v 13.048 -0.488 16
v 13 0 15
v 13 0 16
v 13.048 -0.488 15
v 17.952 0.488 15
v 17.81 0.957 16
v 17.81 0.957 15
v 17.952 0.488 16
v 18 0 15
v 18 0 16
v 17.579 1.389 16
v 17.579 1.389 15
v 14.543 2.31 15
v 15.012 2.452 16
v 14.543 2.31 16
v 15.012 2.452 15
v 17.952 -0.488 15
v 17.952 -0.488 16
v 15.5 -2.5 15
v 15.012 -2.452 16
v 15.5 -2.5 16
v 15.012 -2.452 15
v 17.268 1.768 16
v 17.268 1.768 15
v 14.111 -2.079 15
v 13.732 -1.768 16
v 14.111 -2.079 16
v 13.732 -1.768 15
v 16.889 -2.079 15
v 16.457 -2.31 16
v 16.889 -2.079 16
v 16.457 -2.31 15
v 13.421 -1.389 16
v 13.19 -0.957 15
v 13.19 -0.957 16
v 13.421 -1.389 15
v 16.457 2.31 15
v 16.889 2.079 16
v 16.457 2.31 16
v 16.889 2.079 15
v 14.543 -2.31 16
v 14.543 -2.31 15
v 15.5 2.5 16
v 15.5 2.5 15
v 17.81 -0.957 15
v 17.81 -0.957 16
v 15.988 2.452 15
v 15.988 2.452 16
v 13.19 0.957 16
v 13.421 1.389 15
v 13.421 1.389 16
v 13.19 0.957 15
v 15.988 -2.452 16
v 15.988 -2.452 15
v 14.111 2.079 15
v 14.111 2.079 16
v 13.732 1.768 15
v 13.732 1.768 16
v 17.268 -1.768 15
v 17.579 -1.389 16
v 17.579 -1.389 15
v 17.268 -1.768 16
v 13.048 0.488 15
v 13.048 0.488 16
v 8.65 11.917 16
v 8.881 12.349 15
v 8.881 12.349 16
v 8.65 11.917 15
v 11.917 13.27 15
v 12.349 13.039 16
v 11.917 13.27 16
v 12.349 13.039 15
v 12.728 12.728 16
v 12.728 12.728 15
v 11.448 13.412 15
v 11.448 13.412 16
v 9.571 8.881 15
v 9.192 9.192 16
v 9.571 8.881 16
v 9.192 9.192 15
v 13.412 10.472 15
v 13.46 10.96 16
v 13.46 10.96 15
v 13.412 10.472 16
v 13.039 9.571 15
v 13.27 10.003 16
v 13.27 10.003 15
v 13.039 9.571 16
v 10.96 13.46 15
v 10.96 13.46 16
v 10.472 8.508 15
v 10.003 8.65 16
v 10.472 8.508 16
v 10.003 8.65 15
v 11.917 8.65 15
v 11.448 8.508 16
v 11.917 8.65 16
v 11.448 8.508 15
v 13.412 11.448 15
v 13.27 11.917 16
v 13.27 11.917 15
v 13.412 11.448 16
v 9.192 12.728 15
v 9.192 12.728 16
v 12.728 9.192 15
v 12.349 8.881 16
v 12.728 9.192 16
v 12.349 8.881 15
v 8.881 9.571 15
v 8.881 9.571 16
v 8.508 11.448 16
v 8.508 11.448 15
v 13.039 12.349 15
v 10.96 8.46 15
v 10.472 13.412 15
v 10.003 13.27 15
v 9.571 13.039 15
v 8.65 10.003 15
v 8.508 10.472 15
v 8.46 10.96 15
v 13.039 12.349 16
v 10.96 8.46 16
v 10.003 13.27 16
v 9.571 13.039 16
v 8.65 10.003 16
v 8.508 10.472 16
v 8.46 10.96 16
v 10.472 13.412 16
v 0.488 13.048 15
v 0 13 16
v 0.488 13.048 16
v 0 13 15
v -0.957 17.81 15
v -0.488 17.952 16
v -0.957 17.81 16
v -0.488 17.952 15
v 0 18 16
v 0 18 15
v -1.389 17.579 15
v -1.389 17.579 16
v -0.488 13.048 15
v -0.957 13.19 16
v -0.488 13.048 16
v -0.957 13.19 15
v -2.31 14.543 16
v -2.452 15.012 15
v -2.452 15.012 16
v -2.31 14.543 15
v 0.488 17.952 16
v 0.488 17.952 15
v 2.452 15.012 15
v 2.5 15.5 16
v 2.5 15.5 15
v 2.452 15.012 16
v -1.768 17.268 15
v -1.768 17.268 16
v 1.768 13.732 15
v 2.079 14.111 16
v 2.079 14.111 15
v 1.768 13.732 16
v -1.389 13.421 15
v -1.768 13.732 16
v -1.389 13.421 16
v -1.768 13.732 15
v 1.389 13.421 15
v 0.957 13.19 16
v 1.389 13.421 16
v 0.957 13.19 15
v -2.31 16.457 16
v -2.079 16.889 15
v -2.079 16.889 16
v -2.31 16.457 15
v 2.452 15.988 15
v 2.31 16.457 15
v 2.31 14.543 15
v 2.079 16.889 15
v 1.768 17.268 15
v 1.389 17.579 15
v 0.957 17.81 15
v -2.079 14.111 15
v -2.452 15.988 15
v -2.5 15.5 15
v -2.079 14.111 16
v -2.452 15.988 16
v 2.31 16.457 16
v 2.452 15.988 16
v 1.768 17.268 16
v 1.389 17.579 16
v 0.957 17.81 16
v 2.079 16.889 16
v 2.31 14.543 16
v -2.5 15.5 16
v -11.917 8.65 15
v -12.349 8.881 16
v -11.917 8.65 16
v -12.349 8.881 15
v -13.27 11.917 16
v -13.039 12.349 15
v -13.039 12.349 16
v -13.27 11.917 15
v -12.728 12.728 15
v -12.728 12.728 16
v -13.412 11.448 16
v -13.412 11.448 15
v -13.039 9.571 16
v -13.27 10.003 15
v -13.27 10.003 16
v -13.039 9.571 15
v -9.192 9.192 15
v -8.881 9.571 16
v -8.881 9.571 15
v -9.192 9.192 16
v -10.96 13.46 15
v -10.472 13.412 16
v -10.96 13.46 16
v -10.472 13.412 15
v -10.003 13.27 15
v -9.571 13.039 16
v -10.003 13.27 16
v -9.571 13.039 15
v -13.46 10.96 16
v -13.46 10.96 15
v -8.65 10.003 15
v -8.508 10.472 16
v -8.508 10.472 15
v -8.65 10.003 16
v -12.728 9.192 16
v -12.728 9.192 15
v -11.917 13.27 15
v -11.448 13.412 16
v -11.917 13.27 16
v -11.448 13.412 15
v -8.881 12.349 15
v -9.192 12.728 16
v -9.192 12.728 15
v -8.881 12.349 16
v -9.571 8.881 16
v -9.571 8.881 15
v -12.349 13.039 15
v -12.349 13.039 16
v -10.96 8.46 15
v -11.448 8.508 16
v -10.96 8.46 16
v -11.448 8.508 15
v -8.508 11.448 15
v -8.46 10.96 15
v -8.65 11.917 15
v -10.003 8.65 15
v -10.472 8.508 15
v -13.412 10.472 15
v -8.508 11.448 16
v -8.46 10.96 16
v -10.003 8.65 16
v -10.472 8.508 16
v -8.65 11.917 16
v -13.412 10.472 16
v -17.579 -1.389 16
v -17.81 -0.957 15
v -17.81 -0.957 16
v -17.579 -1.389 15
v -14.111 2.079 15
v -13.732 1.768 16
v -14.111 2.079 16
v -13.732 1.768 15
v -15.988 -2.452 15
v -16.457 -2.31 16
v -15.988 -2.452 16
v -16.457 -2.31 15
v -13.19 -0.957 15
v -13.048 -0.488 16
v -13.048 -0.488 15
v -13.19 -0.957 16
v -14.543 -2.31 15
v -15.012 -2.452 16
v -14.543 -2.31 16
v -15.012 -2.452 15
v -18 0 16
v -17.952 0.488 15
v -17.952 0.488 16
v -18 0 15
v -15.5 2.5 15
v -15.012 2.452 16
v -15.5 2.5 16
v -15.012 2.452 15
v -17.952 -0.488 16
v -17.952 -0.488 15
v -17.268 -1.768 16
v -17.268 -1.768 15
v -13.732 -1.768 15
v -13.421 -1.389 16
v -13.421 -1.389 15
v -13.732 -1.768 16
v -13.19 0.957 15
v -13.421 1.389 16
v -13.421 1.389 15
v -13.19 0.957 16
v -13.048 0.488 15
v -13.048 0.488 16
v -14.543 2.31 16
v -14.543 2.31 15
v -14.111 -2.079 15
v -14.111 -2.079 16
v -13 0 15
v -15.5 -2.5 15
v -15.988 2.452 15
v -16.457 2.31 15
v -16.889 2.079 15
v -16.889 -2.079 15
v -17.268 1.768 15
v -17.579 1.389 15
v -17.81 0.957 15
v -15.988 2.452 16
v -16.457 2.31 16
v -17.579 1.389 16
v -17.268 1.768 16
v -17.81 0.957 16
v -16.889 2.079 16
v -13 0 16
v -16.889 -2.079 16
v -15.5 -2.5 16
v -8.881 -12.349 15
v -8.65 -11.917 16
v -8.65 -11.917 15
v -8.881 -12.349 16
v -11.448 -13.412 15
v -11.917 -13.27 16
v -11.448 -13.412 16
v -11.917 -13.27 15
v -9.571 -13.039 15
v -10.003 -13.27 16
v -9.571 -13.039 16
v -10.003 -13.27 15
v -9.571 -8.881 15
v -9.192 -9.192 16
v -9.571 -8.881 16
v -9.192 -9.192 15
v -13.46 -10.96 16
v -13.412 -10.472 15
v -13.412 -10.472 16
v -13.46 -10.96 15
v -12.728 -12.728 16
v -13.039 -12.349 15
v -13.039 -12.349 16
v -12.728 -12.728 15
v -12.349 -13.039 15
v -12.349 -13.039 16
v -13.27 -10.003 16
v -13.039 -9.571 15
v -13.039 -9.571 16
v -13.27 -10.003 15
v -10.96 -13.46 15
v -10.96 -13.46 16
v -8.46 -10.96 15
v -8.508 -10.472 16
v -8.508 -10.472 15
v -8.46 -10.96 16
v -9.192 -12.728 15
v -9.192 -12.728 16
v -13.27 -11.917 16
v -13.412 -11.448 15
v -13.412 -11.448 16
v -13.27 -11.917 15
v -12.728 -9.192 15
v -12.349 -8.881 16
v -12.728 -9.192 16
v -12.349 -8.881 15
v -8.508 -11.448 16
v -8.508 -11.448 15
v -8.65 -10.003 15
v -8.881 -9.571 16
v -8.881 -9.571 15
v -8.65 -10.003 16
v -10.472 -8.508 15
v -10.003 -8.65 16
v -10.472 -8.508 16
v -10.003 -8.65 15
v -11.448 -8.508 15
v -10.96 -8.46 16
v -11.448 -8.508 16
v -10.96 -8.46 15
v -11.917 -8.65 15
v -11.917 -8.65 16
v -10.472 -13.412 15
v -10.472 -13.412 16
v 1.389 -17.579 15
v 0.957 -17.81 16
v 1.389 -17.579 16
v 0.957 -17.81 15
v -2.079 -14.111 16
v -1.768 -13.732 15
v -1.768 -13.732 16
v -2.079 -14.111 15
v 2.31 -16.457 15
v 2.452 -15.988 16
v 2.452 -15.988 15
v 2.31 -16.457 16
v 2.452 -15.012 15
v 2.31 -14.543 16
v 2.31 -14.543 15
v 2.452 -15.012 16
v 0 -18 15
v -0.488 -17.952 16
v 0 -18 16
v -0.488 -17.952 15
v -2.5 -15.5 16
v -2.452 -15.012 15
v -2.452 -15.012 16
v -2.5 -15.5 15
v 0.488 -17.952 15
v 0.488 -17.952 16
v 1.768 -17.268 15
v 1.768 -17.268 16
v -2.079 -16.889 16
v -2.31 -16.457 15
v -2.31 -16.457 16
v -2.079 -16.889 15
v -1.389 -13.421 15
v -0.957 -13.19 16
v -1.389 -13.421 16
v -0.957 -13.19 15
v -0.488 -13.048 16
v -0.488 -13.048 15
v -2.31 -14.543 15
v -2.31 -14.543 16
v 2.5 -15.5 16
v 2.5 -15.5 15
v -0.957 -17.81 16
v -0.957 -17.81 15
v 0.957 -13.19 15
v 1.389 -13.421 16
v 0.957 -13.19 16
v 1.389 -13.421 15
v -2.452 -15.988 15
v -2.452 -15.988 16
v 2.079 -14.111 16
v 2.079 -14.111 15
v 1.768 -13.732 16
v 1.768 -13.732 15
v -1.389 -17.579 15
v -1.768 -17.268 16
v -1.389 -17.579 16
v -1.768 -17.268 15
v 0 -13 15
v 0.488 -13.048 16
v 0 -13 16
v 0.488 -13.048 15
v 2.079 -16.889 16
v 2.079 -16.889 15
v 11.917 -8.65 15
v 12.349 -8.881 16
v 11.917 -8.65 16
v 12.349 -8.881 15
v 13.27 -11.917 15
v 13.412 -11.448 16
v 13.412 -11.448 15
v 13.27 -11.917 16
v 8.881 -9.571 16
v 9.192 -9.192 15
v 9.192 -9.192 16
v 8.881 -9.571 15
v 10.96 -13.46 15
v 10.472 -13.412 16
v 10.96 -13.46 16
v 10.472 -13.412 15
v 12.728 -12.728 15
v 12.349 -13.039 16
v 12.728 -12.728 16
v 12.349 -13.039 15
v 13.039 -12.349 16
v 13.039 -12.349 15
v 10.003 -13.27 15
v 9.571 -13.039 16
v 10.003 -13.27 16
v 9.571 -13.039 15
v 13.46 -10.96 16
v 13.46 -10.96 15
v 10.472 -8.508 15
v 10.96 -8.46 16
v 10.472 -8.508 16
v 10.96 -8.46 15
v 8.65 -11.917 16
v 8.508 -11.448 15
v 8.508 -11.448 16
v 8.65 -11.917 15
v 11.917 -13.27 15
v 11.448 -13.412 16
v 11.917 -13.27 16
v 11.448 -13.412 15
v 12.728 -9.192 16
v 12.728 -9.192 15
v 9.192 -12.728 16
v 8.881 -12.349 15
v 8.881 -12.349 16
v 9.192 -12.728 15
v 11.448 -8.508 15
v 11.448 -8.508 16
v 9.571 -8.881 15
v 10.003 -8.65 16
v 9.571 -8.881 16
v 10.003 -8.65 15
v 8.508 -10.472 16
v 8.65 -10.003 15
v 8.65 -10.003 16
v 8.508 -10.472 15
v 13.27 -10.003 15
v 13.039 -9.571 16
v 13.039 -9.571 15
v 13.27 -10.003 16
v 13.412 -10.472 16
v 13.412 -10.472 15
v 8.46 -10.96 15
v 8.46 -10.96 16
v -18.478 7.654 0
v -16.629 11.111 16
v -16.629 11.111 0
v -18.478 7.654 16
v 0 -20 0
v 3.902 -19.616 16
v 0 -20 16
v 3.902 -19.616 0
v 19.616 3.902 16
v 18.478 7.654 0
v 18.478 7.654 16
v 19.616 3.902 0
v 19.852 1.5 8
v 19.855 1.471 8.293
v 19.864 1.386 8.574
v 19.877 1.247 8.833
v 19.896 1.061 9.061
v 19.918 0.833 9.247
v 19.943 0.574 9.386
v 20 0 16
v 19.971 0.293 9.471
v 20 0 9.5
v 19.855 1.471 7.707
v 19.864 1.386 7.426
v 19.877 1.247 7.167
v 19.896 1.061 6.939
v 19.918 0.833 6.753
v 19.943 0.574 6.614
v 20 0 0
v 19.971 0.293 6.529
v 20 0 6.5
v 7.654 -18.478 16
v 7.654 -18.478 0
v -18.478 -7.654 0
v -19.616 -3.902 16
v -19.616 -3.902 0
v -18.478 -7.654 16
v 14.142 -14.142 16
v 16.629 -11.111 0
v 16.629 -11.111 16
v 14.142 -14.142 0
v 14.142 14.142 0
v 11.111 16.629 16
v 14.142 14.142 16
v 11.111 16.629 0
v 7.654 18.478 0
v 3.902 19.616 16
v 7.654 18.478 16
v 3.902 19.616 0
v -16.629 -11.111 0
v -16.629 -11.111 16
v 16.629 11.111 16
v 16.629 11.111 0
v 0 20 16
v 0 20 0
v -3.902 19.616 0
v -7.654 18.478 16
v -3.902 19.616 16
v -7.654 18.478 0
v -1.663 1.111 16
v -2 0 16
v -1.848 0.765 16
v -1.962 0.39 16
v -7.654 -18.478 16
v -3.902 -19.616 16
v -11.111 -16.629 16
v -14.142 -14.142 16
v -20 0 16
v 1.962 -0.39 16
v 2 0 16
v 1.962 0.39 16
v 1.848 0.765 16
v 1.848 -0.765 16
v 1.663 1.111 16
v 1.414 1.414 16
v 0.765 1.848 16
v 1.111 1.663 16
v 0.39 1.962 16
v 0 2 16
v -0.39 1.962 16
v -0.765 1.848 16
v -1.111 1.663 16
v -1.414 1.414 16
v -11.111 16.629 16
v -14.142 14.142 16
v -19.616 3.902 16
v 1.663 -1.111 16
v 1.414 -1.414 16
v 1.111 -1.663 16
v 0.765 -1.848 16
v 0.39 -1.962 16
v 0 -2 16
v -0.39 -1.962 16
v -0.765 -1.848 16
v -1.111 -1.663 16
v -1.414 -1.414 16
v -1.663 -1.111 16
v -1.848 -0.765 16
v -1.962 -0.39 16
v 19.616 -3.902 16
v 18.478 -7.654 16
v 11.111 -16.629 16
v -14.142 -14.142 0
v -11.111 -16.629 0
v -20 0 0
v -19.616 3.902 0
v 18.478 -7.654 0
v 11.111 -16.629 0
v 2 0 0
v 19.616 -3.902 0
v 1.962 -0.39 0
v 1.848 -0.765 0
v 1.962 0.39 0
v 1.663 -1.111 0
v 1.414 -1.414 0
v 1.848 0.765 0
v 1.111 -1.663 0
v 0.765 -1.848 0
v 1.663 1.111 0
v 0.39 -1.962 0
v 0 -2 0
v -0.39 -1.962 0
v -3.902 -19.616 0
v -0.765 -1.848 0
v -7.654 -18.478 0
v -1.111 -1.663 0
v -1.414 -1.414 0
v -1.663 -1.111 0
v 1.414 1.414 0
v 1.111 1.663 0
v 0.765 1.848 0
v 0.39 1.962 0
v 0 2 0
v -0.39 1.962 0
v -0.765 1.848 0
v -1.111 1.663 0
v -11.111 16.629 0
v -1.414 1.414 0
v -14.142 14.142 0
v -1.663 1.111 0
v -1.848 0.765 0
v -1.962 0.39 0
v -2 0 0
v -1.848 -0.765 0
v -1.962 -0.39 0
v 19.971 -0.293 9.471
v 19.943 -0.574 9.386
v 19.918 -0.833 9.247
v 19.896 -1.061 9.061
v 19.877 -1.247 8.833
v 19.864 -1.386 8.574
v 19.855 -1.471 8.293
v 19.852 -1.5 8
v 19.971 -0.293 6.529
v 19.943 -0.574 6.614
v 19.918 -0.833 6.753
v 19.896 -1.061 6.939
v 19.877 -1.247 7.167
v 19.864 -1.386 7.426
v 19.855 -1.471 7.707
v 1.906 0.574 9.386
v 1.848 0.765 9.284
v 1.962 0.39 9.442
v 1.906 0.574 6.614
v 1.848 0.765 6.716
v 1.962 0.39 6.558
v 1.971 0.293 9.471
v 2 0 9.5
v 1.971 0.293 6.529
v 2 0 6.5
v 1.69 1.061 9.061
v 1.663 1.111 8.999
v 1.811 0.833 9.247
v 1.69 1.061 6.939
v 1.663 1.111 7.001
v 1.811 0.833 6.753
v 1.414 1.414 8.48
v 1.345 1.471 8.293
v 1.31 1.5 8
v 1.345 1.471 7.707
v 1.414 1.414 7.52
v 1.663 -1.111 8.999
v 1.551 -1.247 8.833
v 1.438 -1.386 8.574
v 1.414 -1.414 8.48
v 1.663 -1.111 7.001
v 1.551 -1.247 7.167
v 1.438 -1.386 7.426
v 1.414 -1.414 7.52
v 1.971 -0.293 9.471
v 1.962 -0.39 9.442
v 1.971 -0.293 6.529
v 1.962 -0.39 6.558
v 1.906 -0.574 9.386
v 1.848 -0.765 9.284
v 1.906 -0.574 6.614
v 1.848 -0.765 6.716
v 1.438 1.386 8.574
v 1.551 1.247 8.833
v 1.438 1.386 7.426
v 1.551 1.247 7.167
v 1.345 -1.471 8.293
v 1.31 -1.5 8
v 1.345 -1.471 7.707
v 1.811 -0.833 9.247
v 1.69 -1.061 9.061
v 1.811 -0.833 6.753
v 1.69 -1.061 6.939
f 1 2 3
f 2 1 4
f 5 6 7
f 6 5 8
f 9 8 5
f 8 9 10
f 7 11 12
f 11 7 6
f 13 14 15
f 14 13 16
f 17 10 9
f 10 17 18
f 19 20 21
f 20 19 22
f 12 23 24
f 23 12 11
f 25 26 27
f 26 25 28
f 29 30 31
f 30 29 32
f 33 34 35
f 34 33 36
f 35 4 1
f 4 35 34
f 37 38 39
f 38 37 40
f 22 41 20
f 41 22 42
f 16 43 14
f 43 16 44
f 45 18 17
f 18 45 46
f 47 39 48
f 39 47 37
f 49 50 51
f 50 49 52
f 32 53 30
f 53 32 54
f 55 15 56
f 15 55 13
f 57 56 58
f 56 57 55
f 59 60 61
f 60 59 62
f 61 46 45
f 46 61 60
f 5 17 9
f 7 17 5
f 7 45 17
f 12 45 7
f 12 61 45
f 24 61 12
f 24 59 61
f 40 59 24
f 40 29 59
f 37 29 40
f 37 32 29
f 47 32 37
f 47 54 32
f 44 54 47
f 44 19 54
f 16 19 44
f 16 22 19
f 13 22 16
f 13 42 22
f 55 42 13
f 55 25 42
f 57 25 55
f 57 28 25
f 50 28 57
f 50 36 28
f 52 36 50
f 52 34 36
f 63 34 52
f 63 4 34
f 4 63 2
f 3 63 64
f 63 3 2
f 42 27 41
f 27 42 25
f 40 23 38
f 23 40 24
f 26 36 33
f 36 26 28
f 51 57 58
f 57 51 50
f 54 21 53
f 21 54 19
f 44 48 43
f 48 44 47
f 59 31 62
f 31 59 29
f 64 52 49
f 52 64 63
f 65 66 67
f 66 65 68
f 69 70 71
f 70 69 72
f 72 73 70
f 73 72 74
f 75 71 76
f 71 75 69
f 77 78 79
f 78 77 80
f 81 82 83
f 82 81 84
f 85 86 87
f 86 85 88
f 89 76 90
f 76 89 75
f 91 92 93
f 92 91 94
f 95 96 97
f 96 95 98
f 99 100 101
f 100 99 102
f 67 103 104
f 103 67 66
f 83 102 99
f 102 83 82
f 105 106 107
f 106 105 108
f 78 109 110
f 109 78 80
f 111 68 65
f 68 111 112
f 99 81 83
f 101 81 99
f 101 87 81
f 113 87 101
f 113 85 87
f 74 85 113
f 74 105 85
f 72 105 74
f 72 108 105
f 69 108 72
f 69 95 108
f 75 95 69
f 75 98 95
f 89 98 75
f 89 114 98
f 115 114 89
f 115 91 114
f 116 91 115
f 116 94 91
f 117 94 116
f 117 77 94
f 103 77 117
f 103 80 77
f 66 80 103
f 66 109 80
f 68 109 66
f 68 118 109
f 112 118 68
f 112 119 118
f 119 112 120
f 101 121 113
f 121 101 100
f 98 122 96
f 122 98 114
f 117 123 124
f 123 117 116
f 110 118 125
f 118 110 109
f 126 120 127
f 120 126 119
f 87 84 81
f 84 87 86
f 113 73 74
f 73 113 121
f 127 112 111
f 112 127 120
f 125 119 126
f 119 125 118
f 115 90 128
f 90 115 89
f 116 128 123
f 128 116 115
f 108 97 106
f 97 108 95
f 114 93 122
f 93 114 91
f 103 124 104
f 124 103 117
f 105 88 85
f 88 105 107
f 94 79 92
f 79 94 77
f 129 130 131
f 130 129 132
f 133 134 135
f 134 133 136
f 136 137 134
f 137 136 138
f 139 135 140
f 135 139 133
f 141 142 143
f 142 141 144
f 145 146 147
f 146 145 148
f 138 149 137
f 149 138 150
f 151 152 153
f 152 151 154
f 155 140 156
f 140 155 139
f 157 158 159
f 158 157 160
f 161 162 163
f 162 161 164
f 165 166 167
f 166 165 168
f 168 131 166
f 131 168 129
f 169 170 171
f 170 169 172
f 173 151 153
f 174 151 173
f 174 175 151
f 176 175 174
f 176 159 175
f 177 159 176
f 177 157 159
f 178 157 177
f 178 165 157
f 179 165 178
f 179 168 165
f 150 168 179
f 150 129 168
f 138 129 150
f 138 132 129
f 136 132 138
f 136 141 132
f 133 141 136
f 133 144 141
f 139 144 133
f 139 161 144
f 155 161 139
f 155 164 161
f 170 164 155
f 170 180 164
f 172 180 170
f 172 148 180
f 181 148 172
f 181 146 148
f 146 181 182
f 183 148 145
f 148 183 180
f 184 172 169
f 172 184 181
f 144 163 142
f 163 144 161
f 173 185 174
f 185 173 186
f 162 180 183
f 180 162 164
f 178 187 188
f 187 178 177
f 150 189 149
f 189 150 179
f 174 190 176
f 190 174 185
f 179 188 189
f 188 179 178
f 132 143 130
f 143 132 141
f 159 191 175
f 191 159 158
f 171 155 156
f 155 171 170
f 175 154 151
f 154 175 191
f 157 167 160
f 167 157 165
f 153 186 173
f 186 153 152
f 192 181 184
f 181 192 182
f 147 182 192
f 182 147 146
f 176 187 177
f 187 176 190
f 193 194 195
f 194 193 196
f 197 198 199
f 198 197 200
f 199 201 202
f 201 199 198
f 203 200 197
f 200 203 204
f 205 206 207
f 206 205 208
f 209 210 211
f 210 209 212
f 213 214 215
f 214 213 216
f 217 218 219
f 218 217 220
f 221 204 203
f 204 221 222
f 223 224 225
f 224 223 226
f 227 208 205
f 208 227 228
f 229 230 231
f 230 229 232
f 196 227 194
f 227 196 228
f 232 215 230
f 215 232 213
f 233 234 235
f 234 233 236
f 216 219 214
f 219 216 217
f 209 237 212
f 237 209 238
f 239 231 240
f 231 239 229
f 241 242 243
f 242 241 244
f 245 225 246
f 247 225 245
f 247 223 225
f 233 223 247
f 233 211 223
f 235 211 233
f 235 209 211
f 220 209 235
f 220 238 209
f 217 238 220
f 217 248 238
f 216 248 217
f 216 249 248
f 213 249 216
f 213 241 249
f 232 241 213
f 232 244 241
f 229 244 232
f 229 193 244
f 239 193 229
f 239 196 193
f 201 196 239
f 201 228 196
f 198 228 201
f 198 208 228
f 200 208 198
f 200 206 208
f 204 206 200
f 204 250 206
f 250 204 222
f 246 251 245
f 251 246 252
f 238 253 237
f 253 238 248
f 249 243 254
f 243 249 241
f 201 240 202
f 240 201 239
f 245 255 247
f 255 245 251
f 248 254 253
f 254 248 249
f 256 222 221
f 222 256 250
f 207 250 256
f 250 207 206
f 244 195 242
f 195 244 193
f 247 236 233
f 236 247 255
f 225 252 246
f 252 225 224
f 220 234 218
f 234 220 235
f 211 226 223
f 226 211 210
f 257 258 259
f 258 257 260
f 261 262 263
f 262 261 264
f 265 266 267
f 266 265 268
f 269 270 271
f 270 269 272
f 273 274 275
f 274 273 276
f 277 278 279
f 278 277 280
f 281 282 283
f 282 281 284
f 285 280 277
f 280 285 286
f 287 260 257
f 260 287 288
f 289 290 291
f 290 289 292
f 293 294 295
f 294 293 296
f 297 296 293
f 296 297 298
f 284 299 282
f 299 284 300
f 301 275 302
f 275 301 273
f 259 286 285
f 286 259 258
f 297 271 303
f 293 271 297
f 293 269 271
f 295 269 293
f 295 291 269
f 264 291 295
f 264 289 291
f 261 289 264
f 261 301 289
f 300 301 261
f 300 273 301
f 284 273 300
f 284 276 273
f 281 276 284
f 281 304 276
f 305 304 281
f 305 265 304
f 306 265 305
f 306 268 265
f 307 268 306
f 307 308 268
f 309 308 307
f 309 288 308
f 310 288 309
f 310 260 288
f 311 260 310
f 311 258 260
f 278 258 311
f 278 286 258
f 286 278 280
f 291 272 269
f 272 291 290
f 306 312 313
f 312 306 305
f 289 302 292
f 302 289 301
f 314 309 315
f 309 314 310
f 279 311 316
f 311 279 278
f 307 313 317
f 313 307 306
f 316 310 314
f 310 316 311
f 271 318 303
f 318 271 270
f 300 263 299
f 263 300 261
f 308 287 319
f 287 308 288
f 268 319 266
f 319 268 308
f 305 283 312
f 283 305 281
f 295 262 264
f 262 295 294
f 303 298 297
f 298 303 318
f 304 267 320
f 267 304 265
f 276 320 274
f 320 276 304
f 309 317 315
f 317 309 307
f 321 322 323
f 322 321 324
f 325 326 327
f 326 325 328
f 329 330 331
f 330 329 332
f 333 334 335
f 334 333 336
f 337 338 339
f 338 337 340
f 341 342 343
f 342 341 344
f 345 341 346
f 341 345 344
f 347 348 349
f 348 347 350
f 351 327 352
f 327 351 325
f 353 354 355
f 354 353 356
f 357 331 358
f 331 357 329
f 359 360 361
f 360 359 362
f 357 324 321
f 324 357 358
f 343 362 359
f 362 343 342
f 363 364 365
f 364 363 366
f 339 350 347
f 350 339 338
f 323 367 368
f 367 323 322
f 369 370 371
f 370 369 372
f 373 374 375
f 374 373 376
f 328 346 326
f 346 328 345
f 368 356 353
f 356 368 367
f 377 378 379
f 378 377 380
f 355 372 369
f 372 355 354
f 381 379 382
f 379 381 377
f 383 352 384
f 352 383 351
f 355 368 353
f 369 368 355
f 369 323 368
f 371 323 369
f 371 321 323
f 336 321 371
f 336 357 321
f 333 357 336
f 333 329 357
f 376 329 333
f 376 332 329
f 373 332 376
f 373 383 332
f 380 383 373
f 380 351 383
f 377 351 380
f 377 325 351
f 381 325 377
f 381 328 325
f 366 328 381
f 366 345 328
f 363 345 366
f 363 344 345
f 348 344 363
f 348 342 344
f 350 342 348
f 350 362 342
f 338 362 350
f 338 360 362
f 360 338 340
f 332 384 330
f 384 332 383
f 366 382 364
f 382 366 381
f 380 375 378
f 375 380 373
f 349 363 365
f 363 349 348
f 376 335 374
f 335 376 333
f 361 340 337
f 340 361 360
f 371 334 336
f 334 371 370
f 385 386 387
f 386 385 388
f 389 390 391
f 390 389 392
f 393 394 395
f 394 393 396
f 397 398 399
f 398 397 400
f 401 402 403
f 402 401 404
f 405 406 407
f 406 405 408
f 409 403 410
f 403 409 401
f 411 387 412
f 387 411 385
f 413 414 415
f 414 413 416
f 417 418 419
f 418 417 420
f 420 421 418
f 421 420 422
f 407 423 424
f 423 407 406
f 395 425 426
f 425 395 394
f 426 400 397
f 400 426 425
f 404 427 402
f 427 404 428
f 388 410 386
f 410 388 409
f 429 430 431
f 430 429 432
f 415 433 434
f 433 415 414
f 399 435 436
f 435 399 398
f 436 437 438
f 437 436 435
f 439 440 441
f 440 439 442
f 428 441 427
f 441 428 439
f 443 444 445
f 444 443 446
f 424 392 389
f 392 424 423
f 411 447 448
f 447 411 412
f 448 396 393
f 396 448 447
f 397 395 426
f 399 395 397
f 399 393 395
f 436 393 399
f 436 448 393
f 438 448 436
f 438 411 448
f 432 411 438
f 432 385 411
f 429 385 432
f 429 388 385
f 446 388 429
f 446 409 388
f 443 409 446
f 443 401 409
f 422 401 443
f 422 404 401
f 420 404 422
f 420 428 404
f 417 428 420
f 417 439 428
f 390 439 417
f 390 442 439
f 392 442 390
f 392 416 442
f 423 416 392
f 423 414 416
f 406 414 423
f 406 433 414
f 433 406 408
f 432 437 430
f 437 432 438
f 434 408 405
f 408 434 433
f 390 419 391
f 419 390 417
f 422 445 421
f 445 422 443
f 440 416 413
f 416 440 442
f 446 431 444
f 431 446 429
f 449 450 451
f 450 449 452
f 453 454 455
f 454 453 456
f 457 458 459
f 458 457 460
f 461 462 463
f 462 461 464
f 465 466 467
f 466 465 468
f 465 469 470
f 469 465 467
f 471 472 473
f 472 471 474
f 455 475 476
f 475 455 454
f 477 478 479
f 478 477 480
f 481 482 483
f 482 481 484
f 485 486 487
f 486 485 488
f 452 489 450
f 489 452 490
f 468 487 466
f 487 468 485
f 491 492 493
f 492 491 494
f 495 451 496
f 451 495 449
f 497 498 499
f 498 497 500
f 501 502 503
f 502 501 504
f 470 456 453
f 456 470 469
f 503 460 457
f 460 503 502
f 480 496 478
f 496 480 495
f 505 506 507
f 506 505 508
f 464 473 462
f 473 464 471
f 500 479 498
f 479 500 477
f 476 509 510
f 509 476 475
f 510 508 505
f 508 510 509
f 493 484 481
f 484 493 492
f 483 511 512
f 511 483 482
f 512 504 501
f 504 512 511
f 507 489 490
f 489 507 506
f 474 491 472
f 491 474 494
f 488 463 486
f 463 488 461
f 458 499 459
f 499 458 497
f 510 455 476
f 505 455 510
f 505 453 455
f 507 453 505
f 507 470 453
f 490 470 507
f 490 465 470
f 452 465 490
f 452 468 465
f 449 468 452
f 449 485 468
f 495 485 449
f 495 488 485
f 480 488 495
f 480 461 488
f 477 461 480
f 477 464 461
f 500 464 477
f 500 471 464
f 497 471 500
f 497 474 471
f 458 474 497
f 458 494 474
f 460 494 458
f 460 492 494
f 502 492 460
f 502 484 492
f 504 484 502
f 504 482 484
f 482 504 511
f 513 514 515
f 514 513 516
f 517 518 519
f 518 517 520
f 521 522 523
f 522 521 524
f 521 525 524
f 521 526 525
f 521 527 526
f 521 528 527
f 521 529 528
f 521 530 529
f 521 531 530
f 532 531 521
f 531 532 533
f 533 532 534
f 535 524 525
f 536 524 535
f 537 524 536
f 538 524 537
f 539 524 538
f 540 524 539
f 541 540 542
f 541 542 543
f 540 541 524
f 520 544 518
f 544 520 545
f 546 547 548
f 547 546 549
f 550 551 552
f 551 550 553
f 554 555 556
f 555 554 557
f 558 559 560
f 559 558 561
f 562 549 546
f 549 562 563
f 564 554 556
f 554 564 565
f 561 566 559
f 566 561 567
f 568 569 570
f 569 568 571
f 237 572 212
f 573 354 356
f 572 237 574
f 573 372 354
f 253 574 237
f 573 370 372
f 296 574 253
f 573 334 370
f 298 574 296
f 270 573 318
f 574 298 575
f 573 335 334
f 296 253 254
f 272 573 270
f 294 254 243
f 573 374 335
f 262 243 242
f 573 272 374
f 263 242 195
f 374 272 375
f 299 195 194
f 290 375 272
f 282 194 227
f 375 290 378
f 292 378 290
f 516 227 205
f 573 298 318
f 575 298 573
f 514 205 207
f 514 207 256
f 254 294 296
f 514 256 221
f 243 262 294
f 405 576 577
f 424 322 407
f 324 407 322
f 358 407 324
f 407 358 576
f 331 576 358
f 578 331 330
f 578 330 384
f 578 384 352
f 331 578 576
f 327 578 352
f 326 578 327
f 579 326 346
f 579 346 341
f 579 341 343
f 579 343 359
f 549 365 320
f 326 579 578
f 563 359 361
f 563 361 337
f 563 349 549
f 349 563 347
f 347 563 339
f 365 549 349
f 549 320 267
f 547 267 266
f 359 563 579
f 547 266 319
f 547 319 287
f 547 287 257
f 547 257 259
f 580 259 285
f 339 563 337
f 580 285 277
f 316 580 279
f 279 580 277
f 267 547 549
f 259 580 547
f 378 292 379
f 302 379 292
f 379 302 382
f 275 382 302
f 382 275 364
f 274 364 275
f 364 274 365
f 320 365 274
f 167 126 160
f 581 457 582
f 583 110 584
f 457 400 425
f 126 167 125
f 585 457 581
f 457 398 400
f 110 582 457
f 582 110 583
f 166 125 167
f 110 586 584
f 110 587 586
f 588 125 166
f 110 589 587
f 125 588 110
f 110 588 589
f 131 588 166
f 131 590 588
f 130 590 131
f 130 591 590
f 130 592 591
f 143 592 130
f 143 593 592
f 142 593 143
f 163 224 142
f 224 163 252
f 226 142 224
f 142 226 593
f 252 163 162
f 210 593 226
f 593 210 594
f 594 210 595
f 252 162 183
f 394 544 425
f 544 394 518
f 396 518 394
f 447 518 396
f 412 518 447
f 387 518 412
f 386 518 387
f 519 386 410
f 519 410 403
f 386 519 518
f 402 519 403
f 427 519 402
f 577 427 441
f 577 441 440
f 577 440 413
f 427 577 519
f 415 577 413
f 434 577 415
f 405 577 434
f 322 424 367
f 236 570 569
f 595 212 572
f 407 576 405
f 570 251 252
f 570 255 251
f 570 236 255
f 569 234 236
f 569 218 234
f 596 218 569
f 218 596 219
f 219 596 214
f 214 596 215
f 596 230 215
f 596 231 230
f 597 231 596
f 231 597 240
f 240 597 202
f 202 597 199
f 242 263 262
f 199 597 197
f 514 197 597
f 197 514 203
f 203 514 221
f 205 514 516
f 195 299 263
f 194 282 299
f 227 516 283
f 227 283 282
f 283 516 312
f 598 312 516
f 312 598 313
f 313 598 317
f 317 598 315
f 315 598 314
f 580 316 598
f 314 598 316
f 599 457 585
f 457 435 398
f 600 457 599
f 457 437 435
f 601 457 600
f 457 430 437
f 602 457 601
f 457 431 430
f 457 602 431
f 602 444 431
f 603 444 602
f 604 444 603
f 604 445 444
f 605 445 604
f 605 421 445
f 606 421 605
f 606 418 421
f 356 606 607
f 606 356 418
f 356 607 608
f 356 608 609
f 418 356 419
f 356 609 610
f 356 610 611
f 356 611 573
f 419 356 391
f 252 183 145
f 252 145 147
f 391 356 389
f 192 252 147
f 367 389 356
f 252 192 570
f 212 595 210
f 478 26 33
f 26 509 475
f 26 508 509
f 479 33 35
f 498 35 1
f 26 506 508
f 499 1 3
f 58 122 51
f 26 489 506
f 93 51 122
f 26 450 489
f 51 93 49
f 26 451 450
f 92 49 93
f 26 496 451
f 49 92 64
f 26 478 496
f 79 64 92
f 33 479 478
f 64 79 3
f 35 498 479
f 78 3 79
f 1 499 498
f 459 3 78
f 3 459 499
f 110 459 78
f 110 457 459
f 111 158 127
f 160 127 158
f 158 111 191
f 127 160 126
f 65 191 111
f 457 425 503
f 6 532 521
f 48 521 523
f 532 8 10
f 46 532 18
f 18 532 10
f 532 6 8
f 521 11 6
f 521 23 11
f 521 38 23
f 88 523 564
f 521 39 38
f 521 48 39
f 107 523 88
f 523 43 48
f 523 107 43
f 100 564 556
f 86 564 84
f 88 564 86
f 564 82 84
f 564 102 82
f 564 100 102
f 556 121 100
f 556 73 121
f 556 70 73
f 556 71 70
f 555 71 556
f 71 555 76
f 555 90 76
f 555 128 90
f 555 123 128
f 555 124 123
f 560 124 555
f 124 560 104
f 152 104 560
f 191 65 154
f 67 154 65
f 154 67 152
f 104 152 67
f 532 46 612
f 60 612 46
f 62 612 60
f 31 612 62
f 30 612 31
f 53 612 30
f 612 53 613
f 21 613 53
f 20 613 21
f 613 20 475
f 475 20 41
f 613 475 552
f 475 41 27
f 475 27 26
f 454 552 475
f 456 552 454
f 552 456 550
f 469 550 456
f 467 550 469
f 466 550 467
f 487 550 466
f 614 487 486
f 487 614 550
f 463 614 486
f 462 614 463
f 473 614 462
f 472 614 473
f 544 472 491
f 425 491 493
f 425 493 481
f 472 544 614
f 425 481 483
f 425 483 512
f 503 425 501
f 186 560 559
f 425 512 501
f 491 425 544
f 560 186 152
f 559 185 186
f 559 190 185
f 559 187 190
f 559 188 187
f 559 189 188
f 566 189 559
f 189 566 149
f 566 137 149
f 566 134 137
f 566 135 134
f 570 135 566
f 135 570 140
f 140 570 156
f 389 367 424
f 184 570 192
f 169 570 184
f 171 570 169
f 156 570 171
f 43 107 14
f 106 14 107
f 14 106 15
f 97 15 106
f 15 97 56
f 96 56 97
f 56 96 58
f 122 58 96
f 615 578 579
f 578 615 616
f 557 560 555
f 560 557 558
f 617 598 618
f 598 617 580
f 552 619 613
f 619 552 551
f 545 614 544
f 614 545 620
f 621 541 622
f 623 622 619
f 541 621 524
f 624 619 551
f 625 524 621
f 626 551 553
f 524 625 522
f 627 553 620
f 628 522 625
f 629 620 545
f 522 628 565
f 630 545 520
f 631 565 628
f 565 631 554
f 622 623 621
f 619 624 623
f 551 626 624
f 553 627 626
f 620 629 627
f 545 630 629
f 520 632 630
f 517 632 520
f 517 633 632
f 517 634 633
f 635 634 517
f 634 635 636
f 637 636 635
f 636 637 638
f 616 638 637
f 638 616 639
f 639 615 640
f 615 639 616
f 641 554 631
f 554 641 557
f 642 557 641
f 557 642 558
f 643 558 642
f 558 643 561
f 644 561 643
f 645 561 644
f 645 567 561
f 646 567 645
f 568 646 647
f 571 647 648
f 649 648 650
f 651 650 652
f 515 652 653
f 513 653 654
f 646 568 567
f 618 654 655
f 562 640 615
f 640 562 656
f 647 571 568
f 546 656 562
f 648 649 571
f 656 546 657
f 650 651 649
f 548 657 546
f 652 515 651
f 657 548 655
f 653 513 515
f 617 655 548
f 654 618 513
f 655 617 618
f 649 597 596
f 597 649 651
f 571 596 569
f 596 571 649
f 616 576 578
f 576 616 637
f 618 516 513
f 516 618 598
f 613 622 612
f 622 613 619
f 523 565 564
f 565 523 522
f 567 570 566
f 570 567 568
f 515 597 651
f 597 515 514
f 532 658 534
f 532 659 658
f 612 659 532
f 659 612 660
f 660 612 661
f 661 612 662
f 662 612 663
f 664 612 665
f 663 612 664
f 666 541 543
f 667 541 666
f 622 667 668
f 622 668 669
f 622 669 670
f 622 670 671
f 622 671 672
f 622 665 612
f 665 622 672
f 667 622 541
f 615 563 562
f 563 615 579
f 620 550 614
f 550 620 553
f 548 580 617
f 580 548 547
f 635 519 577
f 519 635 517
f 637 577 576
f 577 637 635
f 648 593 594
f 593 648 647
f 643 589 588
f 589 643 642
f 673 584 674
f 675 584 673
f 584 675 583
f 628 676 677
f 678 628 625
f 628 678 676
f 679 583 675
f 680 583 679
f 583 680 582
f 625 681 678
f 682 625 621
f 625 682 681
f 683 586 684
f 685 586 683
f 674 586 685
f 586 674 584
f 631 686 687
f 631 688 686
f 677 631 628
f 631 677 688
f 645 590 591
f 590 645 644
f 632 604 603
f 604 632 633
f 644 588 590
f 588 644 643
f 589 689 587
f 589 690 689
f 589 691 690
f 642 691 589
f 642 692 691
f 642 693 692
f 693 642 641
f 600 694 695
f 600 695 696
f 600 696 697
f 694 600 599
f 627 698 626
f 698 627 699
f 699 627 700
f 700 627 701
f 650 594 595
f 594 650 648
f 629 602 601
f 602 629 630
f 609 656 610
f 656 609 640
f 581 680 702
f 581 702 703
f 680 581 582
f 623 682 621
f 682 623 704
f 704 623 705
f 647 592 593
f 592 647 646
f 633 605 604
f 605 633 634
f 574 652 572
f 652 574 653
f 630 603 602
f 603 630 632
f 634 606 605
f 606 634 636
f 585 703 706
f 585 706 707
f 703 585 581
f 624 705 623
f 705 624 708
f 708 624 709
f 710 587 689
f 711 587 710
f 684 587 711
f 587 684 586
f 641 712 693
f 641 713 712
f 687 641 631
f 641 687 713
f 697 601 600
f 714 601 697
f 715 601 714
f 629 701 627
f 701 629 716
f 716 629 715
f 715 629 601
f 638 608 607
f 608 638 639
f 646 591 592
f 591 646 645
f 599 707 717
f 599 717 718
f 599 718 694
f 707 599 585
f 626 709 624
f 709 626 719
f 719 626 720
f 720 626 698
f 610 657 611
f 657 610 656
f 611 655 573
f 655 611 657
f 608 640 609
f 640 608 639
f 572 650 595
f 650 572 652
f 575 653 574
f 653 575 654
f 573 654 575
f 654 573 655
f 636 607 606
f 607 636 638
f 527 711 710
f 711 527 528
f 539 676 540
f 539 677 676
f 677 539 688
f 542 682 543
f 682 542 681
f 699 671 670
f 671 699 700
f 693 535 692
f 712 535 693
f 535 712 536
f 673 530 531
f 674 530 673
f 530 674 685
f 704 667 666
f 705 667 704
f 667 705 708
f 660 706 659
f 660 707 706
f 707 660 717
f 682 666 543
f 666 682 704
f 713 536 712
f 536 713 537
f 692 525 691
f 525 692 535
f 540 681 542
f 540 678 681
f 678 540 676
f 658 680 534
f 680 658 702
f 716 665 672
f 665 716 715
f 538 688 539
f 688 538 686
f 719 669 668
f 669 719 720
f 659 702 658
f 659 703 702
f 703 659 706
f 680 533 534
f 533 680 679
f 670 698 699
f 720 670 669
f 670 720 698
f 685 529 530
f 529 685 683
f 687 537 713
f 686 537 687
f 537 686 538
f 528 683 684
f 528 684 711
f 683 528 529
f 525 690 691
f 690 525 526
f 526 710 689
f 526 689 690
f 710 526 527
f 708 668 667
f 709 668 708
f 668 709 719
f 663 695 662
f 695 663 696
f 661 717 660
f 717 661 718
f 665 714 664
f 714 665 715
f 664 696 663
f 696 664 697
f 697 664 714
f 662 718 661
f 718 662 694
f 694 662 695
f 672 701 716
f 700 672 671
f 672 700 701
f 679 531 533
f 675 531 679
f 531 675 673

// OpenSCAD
$fn = 32;

// ----------------------------------------------------------------------
// Control knob: dimpled knob
// ----------------------------------------------------------------------

// --- parameters (mm) ---
dimp_d = 5;               // finger dimple diameter
n_dimp = 8;               // number of dimples
dimp_r = 15.5;            // dimple ring radius
knob_d = 40;              // knob body diameter
knob_h = 16;              // knob body height
bore_d = 4;               // shaft bore diameter
set_d = 3;                // set screw bore diameter

dimp_step = 360 / n_dimp;  // dimple angular step

difference() {
  cylinder(h = knob_h, d = knob_d);
  translate([0, 0, -1]) cylinder(h = knob_h + 2, d = bore_d);
  translate([-1, 0, knob_h / 2]) rotate([0, 90, 0])
    cylinder(h = knob_d / 2 + bore_d / 2 + 2, d = set_d);  for (i = [0 : n_dimp - 1])
    rotate([0, 0, i * dimp_step])
      translate([dimp_r, 0, knob_h - 1])
        cylinder(h = 2, d = dimp_d);
}
